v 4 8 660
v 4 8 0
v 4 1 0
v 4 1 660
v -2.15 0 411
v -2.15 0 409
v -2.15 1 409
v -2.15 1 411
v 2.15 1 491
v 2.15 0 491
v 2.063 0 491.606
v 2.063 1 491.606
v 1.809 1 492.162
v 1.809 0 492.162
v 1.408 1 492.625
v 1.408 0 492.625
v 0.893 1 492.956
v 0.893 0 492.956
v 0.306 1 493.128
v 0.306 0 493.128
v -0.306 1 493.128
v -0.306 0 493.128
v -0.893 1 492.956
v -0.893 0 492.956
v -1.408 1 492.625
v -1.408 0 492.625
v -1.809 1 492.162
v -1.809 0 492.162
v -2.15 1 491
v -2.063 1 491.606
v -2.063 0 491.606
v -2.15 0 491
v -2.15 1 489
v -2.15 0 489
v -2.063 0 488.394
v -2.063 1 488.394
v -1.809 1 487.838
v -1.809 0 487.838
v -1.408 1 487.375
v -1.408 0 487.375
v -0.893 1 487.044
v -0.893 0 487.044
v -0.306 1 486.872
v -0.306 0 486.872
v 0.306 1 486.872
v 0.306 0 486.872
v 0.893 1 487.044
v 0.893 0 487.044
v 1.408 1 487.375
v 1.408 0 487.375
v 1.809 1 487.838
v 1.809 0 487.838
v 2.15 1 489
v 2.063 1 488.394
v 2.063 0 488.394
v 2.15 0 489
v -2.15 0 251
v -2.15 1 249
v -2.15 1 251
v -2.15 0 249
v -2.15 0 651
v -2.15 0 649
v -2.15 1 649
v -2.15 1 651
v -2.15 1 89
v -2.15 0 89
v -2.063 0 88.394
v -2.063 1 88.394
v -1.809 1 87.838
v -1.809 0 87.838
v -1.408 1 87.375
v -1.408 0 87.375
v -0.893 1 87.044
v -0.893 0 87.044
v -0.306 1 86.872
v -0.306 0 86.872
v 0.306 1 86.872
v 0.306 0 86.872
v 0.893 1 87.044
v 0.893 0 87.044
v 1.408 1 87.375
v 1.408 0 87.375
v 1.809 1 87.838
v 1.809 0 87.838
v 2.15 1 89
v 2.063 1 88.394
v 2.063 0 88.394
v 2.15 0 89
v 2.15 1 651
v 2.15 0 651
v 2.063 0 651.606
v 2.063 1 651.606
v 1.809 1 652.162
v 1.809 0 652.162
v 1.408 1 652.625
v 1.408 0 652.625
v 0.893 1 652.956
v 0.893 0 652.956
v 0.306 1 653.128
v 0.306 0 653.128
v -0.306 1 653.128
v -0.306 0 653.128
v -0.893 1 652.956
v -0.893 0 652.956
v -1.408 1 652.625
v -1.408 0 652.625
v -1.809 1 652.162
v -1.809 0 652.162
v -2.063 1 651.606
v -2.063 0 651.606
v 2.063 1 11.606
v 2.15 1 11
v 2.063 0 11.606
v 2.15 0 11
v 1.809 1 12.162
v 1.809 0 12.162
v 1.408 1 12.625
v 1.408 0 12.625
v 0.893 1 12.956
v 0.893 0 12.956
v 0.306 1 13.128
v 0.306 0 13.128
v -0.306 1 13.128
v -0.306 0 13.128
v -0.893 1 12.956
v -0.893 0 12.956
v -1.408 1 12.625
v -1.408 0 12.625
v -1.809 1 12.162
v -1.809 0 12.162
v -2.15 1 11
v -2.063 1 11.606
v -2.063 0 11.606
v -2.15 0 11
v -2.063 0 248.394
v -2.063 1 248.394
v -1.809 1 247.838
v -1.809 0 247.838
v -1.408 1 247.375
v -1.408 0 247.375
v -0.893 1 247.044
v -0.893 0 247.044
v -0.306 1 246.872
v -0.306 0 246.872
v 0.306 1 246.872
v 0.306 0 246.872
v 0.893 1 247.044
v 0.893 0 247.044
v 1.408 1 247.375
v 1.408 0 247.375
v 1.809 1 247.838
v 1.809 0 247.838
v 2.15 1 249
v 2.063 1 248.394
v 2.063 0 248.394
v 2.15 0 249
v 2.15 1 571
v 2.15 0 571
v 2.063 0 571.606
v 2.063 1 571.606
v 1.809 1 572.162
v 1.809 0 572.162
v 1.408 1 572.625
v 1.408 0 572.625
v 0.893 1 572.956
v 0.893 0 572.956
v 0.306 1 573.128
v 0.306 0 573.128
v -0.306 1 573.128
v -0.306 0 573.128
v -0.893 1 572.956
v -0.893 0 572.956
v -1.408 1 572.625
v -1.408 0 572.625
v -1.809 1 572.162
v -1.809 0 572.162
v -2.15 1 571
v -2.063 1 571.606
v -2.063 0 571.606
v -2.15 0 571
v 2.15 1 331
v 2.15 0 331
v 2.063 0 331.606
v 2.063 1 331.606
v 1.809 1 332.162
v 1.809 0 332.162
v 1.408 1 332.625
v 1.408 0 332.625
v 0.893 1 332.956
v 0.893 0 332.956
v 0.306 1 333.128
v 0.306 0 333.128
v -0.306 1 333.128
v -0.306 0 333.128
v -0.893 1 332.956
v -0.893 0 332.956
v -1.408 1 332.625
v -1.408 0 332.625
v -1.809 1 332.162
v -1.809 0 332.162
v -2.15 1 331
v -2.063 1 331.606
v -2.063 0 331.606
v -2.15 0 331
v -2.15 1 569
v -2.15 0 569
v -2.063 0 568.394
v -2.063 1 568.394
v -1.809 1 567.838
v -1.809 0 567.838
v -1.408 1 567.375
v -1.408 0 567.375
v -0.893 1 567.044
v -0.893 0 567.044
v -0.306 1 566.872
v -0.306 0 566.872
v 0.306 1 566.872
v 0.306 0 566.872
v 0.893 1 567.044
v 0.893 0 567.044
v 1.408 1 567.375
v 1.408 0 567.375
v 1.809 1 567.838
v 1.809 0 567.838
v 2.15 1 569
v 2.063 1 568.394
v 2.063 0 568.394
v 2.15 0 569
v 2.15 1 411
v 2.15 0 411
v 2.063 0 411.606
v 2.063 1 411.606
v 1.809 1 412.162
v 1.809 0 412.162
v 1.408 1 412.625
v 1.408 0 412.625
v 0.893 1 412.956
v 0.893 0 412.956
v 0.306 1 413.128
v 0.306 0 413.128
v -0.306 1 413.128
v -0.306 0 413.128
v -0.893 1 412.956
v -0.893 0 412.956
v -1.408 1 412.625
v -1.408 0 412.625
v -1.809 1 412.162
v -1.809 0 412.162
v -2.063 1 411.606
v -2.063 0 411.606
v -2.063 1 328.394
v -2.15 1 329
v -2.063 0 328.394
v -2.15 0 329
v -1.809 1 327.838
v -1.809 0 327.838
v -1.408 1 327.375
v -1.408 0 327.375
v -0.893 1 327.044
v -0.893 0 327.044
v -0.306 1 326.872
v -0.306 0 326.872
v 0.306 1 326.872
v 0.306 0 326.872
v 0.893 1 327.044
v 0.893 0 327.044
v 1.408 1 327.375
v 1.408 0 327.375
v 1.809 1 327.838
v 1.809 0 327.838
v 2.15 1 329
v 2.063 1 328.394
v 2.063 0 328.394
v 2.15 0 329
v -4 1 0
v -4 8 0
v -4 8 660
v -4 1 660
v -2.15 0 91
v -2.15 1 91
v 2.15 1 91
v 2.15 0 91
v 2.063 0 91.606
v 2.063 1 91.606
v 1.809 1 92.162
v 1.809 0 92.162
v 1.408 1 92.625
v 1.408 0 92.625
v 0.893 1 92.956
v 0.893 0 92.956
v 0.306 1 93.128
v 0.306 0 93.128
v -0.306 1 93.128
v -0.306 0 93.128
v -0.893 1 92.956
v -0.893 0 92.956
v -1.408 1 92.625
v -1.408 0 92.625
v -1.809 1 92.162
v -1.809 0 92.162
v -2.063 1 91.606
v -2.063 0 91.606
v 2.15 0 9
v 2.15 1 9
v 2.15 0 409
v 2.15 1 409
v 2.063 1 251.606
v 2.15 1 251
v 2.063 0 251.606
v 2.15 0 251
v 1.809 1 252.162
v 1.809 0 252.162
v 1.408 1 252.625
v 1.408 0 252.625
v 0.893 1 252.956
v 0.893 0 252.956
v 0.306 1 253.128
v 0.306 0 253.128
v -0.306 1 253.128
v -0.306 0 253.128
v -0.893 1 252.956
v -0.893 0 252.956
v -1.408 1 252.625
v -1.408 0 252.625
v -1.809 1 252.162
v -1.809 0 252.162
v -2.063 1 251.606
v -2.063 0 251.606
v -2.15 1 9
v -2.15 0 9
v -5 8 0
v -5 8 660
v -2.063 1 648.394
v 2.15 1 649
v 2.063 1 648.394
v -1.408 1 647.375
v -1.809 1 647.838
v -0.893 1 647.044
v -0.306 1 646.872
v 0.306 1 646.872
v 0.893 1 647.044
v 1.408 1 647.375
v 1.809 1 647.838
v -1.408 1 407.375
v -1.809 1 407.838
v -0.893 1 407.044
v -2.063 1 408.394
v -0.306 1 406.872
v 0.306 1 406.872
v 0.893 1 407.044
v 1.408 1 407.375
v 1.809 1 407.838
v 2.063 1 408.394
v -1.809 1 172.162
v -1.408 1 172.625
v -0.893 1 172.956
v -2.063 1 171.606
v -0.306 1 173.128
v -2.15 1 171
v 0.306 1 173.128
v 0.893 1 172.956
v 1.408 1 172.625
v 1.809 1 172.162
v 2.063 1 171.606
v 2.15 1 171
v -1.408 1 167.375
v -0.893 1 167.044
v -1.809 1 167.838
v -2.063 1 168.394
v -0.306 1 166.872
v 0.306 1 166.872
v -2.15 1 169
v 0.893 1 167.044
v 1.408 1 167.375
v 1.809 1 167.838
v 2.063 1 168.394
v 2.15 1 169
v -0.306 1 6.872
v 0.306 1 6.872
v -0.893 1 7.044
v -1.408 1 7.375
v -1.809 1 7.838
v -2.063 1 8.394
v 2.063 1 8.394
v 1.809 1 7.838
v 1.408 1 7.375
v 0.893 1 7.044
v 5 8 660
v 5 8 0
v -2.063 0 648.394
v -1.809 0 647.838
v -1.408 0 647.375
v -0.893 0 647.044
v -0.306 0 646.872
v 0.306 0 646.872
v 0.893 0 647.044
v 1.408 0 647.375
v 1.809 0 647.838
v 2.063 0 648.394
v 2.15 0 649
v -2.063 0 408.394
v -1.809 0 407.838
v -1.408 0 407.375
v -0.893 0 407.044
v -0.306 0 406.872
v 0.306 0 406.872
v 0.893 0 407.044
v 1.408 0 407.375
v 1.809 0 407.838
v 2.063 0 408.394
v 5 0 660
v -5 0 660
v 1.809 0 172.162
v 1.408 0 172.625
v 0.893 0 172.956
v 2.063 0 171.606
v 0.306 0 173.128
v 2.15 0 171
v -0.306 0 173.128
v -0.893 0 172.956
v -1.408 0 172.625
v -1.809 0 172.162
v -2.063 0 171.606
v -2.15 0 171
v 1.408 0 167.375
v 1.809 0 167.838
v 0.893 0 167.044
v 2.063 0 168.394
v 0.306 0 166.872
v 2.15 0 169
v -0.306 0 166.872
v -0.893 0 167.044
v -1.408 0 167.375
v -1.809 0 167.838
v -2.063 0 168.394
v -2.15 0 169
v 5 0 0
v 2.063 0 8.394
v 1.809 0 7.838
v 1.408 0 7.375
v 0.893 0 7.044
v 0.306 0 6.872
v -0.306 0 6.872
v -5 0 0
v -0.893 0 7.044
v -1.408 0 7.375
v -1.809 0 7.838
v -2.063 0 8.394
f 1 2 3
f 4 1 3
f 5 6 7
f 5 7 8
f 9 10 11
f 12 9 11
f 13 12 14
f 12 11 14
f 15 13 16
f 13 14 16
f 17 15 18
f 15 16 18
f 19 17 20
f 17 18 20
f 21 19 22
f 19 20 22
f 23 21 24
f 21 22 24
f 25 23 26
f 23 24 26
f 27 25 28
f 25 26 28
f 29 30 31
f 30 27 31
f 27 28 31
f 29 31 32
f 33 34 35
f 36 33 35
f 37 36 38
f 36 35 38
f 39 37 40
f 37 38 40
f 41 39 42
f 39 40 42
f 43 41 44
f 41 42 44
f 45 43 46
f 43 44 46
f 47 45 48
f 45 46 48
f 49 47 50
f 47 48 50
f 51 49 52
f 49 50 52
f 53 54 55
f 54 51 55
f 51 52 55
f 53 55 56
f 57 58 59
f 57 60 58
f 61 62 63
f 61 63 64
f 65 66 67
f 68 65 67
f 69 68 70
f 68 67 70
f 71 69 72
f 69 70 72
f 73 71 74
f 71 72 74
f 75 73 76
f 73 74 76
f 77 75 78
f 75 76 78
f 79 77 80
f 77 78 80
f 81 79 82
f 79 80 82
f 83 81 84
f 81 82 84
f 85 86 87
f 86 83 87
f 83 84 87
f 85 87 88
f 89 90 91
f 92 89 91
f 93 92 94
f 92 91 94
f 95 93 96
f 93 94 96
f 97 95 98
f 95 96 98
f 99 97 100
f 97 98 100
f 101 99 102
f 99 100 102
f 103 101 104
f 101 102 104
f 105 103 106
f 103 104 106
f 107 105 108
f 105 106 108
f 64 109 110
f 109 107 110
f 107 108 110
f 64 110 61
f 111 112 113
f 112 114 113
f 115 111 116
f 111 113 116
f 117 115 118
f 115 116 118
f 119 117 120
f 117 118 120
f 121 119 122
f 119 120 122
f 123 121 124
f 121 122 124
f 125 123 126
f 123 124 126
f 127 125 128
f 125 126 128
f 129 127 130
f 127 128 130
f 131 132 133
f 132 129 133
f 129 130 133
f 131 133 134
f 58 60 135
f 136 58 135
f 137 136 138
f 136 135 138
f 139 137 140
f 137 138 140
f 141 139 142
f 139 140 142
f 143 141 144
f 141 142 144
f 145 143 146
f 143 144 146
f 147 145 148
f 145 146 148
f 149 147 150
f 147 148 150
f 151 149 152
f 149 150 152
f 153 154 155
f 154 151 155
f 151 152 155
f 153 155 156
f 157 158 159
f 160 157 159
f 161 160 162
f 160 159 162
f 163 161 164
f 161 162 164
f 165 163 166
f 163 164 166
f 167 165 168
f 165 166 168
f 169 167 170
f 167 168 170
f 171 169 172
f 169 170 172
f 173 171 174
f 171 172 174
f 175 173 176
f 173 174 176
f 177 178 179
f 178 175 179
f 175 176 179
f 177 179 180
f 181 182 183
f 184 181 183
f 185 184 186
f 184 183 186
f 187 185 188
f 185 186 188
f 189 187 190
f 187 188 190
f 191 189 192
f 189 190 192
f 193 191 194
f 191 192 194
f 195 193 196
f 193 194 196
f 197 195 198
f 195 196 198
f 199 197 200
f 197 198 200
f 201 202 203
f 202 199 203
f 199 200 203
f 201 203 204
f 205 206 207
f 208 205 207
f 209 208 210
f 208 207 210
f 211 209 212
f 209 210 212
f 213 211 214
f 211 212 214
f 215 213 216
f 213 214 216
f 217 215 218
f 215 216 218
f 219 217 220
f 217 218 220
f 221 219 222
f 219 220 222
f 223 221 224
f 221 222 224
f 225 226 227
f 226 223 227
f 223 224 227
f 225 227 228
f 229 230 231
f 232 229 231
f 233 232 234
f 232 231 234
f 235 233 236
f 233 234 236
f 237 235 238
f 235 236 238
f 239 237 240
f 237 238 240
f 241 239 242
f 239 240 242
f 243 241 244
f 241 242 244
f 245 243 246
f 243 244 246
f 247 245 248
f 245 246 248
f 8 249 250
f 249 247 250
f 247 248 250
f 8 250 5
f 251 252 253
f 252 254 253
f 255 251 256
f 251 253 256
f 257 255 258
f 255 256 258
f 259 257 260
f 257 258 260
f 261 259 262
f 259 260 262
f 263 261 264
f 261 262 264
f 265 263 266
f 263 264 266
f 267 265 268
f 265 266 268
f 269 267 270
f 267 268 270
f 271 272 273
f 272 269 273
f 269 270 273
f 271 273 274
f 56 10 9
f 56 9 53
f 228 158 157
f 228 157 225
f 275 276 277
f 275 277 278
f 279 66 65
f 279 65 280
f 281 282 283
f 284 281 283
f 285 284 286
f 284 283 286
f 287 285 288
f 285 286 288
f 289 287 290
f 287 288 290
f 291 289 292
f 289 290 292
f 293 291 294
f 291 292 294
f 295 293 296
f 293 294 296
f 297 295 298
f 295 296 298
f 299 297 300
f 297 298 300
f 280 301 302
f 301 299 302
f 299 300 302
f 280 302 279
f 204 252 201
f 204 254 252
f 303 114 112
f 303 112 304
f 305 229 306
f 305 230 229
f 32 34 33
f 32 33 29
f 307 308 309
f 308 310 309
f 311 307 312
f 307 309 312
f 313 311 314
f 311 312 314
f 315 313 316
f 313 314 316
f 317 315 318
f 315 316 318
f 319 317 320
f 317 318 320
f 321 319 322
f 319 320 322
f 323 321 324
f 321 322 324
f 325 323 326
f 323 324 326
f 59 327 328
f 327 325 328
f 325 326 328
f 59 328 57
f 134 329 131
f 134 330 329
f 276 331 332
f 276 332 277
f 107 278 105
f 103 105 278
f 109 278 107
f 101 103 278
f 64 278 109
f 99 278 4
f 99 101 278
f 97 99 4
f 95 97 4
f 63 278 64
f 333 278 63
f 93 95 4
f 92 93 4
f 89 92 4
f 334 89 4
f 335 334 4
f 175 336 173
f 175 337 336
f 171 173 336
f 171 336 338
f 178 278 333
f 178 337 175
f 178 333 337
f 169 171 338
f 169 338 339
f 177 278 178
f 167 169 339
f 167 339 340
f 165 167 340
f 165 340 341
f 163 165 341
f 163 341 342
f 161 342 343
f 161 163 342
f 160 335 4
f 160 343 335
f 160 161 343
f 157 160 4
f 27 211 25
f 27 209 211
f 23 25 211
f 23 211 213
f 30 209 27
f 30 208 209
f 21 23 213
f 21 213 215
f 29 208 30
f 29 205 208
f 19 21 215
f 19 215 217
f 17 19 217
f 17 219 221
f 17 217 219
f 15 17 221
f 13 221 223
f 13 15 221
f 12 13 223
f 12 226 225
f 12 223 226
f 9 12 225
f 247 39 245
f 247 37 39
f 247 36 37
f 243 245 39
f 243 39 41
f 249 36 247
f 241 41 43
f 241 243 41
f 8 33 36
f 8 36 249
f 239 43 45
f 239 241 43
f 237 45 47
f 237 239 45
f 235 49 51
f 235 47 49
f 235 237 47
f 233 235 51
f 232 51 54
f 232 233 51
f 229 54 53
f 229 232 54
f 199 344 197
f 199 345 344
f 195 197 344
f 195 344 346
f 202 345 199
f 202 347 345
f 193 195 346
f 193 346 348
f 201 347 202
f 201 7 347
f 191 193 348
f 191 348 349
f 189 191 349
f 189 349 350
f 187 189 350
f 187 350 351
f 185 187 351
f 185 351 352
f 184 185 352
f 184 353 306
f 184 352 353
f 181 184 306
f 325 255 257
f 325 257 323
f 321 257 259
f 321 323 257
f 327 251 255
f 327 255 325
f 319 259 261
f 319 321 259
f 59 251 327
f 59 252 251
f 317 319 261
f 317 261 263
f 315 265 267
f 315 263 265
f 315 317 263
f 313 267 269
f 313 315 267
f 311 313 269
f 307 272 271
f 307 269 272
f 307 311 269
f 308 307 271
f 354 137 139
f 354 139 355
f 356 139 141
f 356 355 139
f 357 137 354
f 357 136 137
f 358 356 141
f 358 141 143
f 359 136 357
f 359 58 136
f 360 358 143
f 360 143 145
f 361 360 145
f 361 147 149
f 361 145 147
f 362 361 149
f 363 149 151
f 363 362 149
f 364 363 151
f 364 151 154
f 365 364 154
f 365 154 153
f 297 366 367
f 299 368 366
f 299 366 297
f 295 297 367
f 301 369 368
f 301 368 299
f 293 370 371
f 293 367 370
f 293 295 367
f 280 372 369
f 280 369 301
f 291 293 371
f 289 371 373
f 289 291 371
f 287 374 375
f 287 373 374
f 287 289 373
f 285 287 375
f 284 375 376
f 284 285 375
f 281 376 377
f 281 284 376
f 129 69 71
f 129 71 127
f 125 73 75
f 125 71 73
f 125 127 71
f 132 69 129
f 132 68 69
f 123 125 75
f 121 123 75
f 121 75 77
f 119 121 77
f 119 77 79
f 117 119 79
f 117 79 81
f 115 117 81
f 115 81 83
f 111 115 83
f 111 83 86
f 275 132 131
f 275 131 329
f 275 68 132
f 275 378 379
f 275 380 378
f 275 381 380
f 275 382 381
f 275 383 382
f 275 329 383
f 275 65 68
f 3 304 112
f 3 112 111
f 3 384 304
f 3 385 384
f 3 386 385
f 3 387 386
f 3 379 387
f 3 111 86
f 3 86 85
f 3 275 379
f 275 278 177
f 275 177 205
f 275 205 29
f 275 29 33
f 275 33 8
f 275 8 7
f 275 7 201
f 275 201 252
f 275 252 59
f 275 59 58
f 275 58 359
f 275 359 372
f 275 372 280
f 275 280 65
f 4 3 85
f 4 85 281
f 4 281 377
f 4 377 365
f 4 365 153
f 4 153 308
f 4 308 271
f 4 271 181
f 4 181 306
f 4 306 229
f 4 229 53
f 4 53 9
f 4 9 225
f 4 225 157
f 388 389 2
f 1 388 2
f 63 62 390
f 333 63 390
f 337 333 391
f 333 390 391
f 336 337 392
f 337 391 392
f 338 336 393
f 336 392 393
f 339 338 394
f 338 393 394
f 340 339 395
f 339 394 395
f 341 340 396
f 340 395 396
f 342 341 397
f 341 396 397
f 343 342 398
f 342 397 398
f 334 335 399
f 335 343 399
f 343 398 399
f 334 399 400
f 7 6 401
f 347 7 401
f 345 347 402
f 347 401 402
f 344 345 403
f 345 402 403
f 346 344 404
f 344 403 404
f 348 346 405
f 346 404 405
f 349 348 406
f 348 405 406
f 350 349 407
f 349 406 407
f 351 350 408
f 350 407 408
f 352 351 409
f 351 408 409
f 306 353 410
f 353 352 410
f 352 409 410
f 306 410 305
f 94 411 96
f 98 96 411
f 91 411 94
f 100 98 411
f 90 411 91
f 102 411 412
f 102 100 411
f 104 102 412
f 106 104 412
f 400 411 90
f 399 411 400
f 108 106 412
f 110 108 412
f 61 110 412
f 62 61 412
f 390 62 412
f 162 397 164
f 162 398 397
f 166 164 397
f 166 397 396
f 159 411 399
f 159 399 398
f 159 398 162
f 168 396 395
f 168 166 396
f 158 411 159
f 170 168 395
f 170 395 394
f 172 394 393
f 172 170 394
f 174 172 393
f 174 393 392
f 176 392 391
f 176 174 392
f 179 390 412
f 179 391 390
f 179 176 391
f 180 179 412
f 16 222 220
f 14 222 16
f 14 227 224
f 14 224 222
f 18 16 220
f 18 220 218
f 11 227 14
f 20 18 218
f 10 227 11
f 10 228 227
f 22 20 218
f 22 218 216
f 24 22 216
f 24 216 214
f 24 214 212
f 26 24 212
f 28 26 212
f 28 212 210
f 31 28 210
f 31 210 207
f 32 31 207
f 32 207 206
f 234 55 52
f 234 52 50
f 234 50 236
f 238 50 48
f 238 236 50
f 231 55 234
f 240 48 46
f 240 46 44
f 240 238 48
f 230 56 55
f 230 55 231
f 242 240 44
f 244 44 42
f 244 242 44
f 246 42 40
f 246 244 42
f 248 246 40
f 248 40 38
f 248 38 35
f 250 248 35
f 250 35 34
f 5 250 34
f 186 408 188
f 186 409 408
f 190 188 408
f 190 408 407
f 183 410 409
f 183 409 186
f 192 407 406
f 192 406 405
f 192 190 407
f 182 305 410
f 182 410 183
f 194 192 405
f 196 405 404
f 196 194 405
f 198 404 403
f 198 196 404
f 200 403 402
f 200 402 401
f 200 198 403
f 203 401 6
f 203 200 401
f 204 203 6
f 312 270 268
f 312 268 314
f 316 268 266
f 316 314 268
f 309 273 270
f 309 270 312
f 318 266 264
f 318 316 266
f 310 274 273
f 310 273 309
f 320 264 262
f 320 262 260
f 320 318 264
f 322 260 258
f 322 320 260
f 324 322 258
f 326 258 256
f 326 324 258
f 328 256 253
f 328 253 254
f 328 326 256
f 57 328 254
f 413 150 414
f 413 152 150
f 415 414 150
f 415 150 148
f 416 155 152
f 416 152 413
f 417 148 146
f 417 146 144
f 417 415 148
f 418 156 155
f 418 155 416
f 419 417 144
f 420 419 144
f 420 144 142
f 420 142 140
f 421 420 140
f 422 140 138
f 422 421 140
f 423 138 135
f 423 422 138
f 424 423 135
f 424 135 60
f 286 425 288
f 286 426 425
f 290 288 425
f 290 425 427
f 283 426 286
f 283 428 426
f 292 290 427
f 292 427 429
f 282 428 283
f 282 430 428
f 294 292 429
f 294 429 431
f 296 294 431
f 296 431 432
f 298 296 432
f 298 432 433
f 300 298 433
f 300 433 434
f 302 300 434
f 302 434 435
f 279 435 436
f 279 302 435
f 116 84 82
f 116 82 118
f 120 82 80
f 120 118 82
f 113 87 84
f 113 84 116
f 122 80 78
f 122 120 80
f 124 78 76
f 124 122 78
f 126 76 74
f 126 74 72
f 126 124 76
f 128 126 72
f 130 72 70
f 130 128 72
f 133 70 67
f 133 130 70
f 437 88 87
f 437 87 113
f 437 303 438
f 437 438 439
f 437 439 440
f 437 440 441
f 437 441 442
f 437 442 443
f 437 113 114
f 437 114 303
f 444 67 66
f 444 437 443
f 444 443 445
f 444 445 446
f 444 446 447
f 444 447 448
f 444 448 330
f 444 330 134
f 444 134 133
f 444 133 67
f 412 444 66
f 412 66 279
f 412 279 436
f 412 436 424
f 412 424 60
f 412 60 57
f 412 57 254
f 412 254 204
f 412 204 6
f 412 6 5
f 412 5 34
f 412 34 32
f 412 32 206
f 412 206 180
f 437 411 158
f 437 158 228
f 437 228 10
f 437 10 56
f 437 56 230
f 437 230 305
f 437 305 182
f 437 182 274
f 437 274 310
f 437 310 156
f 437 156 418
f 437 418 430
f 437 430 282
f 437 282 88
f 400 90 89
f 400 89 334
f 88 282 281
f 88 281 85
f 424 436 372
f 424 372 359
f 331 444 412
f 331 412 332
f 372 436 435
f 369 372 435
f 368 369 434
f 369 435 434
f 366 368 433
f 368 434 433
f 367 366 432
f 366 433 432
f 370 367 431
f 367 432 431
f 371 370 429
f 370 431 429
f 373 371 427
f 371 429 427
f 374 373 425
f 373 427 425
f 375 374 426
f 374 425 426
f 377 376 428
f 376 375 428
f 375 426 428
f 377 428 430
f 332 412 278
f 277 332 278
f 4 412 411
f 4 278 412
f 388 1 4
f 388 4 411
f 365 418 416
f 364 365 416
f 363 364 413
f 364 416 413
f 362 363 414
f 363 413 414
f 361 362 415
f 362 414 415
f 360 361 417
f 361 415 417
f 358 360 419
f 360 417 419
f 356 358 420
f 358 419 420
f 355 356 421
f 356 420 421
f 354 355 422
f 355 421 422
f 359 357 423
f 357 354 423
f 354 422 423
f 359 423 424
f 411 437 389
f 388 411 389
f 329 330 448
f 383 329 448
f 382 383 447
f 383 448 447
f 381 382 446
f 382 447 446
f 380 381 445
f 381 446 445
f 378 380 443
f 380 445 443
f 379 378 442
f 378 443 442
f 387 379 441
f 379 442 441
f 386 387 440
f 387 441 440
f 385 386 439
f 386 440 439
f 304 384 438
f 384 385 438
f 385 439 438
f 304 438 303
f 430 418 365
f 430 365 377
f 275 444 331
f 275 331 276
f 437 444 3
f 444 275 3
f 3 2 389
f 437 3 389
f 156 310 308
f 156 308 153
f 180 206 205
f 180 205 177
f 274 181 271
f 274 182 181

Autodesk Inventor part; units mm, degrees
ref_plane "YZ Plane" through (0, 0, 0) normal (1, 0, 0) x (0, 1, 0)
ref_plane "XY Plane" through (0, 0, 0) normal (0, 0, 1) x (1, 0, 0)
sketch "Skizze1" plane through (0, 0, 0) normal (0, 0, 1) x (1, 0, 0)
  line L0 (0, 0) -> (5, 0)
  line L1 (5, 0) -> (5, 8)
  line L2 (5, 8) -> (4, 8)
  line L3 (4, 8) -> (4, 1)
  line L4 (4, 1) -> (0, 1)
  line L5 (0, 9.6) -> (0, -1.6) construction
  line L6 (0, 0) -> (-5, 0)
  line L7 (-5, 0) -> (-5, 8)
  line L8 (-5, 8) -> (-4, 8)
  line L9 (-4, 8) -> (-4, 1)
  line L10 (-4, 1) -> (0, 1)
  dimension "d0" = 1
  dimension "d1" = 1
  dimension "d2" = 8
  dimension "d3" = 5
extrude "Ex-UProfil" add sketch "Skizze1" along normal blind 660
sketch "Skizze2" plane through (0, 0, 0) normal (0, 1, 0) x (-1, 0, 0)
  line L0 (5, 0) -> (-5, 0) projected
  line L1 (-5, 0) -> (-5, 660) projected
  line L2 (5, 660) -> (-5, 660) projected
  line L3 (5, 0) -> (5, 660) projected
  line L4 (0, -53) -> (0, 318) construction
  circle A0 centre (0, 650) radius 2.15 construction
  line L5 (0, 651) -> (0, 649) construction
  line L6 (-2.15, 651) -> (-2.15, 649)
  line L7 (2.15, 649) -> (2.15, 651)
  arc A1 (2.15, 651) -> (-2.15, 651) centre (0, 651) ccw
  arc A2 (-2.15, 649) -> (2.15, 649) centre (0, 649) ccw
  circle A3 centre (0, 570) radius 2.15 construction
  line L8 (0, 571) -> (0, 569) construction
  line L9 (-2.15, 571) -> (-2.15, 569)
  line L10 (2.15, 569) -> (2.15, 571)
  arc A4 (2.15, 571) -> (-2.15, 571) centre (0, 571) ccw
  arc A5 (-2.15, 569) -> (2.15, 569) centre (0, 569) ccw
  circle A6 centre (0, 490) radius 2.15 construction
  line L11 (0, 491) -> (0, 489) construction
  line L12 (-2.15, 491) -> (-2.15, 489)
  line L13 (2.15, 489) -> (2.15, 491)
  arc A7 (2.15, 491) -> (-2.15, 491) centre (0, 491) ccw
  arc A8 (-2.15, 489) -> (2.15, 489) centre (0, 489) ccw
  circle A9 centre (0, 410) radius 2.15 construction
  line L14 (0, 411) -> (0, 409) construction
  line L15 (-2.15, 411) -> (-2.15, 409)
  line L16 (2.15, 409) -> (2.15, 411)
  arc A10 (2.15, 411) -> (-2.15, 411) centre (0, 411) ccw
  arc A11 (-2.15, 409) -> (2.15, 409) centre (0, 409) ccw
  circle A12 centre (0, 330) radius 2.15 construction
  line L17 (0, 331) -> (0, 329) construction
  line L18 (-2.15, 331) -> (-2.15, 329)
  line L19 (2.15, 329) -> (2.15, 331)
  arc A13 (2.15, 331) -> (-2.15, 331) centre (0, 331) ccw
  arc A14 (-2.15, 329) -> (2.15, 329) centre (0, 329) ccw
  circle A15 centre (0, 250) radius 2.15 construction
  line L20 (0, 251) -> (0, 249) construction
  line L21 (-2.15, 251) -> (-2.15, 249)
  line L22 (2.15, 249) -> (2.15, 251)
  arc A16 (2.15, 251) -> (-2.15, 251) centre (0, 251) ccw
  arc A17 (-2.15, 249) -> (2.15, 249) centre (0, 249) ccw
  circle A18 centre (0, 170) radius 2.15 construction
  line L23 (0, 171) -> (0, 169) construction
  line L24 (-2.15, 171) -> (-2.15, 169)
  line L25 (2.15, 169) -> (2.15, 171)
  arc A19 (2.15, 171) -> (-2.15, 171) centre (0, 171) ccw
  arc A20 (-2.15, 169) -> (2.15, 169) centre (0, 169) ccw
  circle A21 centre (0, 90) radius 2.15 construction
  line L26 (0, 91) -> (0, 89) construction
  line L27 (-2.15, 91) -> (-2.15, 89)
  line L28 (2.15, 89) -> (2.15, 91)
  arc A22 (2.15, 91) -> (-2.15, 91) centre (0, 91) ccw
  arc A23 (-2.15, 89) -> (2.15, 89) centre (0, 89) ccw
  circle A24 centre (0, 10) radius 2.15 construction
  line L29 (0, 11) -> (0, 9) construction
  line L30 (-2.15, 11) -> (-2.15, 9)
  line L31 (2.15, 9) -> (2.15, 11)
  arc A25 (2.15, 11) -> (-2.15, 11) centre (0, 11) ccw
  arc A26 (-2.15, 9) -> (2.15, 9) centre (0, 9) ccw
  point P0 (0, 0)
  point P1 (0, 653.15)
  point P2 (0, 646.85)
  point P3 (0, 573.15)
  point P4 (0, 566.85)
  point P5 (0, 493.15)
  point P6 (0, 486.85)
  point P7 (0, 413.15)
  point P8 (0, 406.85)
  point P9 (0, 333.15)
  point P10 (0, 326.85)
  point P11 (0, 253.15)
  point P12 (0, 246.85)
  point P13 (0, 173.15)
  point P14 (0, 166.85)
  point P15 (0, 93.15)
  point P16 (0, 86.85)
  point P17 (0, 13.15)
  point P18 (0, 6.85)
  dimension "d6" = 4.3
  dimension "d7" = 10
  dimension "d8" = 4.3
  dimension "d9" = 6.3
  dimension "d21" = 80
extrude "Ex-Bohrungen" cut sketch "Skizze2" along normal up to surface (1 mm away) contours A1 L7 A2 L6 | A4 L10 A5 L9 | A7 L13 A8 L12 | A10 L16 A11 L15 | A13 L19 A14 L18 | A16 L22 A17 L21 | A19 L25 A20 L24 | A22 L28 A23 L27 | A25 L31 A26 L30
equation "\"d8\" = d6"
properties part number "U-Profil PanelSupport 10x8x660mm"
